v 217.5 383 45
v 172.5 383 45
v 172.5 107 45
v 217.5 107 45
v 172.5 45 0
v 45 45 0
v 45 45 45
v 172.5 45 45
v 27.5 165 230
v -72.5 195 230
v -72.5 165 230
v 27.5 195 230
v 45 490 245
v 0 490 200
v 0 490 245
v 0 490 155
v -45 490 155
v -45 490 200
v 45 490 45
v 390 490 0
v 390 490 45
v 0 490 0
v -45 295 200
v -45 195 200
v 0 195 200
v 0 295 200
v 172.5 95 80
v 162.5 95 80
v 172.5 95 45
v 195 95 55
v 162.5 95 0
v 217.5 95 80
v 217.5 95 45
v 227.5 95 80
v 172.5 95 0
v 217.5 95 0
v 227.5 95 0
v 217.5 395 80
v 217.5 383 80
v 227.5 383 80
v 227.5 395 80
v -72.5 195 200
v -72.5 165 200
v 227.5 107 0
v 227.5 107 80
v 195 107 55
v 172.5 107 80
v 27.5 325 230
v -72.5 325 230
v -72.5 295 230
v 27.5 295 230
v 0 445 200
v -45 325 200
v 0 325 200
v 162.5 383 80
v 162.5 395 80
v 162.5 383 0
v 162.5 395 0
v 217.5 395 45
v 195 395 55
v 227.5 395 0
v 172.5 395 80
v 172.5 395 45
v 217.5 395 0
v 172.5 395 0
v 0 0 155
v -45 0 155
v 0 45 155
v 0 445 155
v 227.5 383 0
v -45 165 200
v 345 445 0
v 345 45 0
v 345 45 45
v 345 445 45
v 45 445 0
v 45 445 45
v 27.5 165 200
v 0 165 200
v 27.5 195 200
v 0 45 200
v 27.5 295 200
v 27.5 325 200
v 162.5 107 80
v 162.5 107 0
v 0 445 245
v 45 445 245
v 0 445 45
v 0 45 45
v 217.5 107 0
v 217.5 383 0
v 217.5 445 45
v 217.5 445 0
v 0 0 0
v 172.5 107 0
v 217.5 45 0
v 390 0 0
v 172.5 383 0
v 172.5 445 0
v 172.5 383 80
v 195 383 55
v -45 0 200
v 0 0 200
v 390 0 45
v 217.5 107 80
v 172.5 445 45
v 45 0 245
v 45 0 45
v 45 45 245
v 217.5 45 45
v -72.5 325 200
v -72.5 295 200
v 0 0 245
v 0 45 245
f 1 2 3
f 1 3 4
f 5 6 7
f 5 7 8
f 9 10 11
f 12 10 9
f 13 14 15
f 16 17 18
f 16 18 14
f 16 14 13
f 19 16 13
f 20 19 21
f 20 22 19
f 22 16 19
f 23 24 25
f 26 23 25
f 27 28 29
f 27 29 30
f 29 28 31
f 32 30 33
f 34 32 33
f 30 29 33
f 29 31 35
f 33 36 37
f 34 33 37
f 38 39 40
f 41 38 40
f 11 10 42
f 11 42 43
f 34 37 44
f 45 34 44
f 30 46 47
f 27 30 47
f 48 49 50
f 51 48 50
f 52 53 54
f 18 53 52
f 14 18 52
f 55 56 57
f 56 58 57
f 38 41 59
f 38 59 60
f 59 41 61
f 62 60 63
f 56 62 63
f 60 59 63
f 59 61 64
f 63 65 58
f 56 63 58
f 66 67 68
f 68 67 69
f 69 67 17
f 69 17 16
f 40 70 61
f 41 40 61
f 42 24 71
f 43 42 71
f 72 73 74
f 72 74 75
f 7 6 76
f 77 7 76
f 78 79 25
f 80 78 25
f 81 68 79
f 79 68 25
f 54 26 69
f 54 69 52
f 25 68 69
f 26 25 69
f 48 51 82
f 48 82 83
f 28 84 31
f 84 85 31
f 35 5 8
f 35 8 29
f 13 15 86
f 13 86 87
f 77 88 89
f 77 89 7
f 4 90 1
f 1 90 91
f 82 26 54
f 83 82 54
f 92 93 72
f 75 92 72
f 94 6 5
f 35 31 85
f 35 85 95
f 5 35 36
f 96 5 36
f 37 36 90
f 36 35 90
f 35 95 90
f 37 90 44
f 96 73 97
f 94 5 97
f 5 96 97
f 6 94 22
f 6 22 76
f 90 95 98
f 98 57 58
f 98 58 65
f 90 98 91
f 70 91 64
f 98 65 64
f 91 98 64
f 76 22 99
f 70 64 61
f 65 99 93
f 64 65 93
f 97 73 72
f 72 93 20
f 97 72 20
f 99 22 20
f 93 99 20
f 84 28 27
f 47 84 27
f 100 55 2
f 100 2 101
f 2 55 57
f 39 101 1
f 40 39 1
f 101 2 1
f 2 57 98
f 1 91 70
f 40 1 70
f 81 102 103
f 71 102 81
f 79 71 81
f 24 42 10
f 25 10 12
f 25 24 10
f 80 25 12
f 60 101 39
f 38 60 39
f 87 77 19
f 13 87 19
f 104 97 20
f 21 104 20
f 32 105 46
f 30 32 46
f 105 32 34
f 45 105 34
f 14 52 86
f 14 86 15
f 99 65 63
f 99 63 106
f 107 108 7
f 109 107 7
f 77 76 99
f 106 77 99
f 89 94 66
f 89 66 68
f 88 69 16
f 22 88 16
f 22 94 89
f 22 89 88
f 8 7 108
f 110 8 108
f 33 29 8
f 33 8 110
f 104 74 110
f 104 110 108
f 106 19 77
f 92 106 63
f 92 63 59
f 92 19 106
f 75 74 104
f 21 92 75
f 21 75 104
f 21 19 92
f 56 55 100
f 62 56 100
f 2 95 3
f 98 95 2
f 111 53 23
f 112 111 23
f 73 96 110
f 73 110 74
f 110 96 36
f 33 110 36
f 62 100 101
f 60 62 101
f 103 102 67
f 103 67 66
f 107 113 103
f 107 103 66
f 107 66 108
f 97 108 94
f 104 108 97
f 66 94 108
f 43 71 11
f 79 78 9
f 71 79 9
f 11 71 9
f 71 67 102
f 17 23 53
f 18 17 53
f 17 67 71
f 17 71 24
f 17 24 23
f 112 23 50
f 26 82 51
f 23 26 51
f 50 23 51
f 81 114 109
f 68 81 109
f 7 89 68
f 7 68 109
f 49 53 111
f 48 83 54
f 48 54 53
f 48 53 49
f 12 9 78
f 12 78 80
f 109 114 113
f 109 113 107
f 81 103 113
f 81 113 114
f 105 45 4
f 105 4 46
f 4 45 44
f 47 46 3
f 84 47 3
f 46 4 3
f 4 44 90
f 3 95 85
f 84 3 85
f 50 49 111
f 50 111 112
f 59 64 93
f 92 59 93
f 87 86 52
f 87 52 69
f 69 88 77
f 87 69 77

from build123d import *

# Parameters (mm, degrees)
F0_W      = 390
F0_H      = 490
F0_W_2    = 127.5
F0_H_2    = 400
F1_DEPTH  = 45
F2_W      = 45
F2_H      = 45
F3_DEPTH  = 200
F4_W      = 45
F4_H      = 45
F5_DEPTH  = 45
F6_W      = 45
F6_H      = 45
F7_DEPTH  = 445
F8_W      = 12
F8_H      = 45
F9_DEPTH  = 10
F10_W     = 12
F10_H     = 45
F11_DEPTH = 10
F13_DEPTH = 35
F15_DEPTH = 12
F16_W     = 12
F16_H     = 45
F17_DEPTH = 10
F18_W     = 12
F18_H     = 45
F19_DEPTH = 10
F21_DEPTH = 35
F23_DEPTH = 12
F24_W     = 45
F24_H     = 30
F25_DEPTH = 30
F26_W     = 30
F26_H     = 30
F27_DEPTH = 27.5
F28_W     = 30
F28_H     = 30
F29_DEPTH = 27.5


with BuildPart() as f1:
    # F0 (on Top) → F1 (new body)
    with BuildSketch(Plane.XY):
        with Locations((195, 245)):
            Rectangle(F0_W, F0_H)
        with Locations((108.75, 245)):
            Rectangle(F0_W_2, F0_H_2, mode=Mode.SUBTRACT)
        with Locations((281.25, 245)):
            Rectangle(F0_W_2, F0_H_2, mode=Mode.SUBTRACT)
    extrude(amount=F1_DEPTH)

    # F2 (on face) → F3 (join)
    with BuildSketch(Plane.XY.offset(45)):
        with Locations((22.5, 22.5)):
            Rectangle(F2_W, F2_H)
        with Locations((22.5, 467.5)):
            Rectangle(F2_W, F2_H)
    extrude(amount=F3_DEPTH)

    # F4 (on face) → F5 (join)
    with BuildSketch(Plane(origin=(0, 0, 0), x_dir=(0, -1, 0), z_dir=(-1, 0, 0))):
        with Locations((-467.5, 177.5)):
            Rectangle(F4_W, F4_H)
    extrude(amount=F5_DEPTH)

    # F6 (on face) → F7 (join)
    with BuildSketch(Plane.XZ.offset(-445)):
        with Locations((-22.5, 177.5)):
            Rectangle(F6_W, F6_H)
    extrude(amount=F7_DEPTH)

    # F8 (on face) → F9 (join)
    with BuildSketch(Plane.YZ.offset(217.5)):
        with Locations((101, 22.5)):
            Rectangle(F8_W, F8_H)
    extrude(amount=F9_DEPTH)

    # F10 (on face) → F11 (join)
    with BuildSketch(Plane(origin=(172.5, 0, 0), x_dir=(0, -1, 0), z_dir=(-1, 0, 0))):
        with Locations((-101, 22.5)):
            Rectangle(F10_W, F10_H)
    extrude(amount=F11_DEPTH)

    # F12 (on face) → F13 (join)
    with BuildSketch(Plane.XY.offset(45)):
        Polygon((217.5, 95), (227.5, 95), (227.5, 107), (217.5, 107), (172.5, 107), (162.5, 107), (162.5, 95), (172.5, 95), align=None)
    extrude(amount=F13_DEPTH)

    # F14 (on face) → F15 (cut)
    with BuildSketch(Plane(origin=(0, 107, 0), x_dir=(-1, 0, 0), z_dir=(0, 1, 0))):
        Polygon((-172.5, 80), (-217.5, 80), (-195, 55), align=None)
    extrude(amount=-F15_DEPTH, mode=Mode.SUBTRACT)

    # F16 (on face) → F17 (join)
    with BuildSketch(Plane.YZ.offset(217.5)):
        with Locations((389, 22.5)):
            Rectangle(F16_W, F16_H)
    extrude(amount=F17_DEPTH)

    # F18 (on face) → F19 (join)
    with BuildSketch(Plane(origin=(172.5, 0, 0), x_dir=(0, -1, 0), z_dir=(-1, 0, 0))):
        with Locations((-389, 22.5)):
            Rectangle(F18_W, F18_H)
    extrude(amount=F19_DEPTH)

    # F20 (on face) → F21 (join)
    with BuildSketch(Plane.XY.offset(45)):
        Polygon((227.5, 383), (227.5, 395), (217.5, 395), (172.5, 395), (162.5, 395), (162.5, 383), (172.5, 383), (217.5, 383), align=None)
    extrude(amount=F21_DEPTH)

    # F22 (on face) → F23 (cut)
    with BuildSketch(Plane.XZ.offset(-383)):
        Polygon((217.5, 80), (172.5, 80), (195, 55), align=None)
    extrude(amount=-F23_DEPTH, mode=Mode.SUBTRACT)

    # F24 (on face) → F25 (join)
    with BuildSketch(Plane.XY.offset(200)):
        with Locations((-22.5, 180)):
            Rectangle(F24_W, F24_H)
        with Locations((-22.5, 310)):
            Rectangle(F24_W, F24_H)
    extrude(amount=F25_DEPTH)

    # F26 (on face) → F27 (join)
    with BuildSketch(Plane.YZ):
        with Locations((310, 215)):
            Rectangle(F26_W, F26_H)
        with Locations((180, 215)):
            Rectangle(F26_W, F26_H)
    extrude(amount=F27_DEPTH)

    # F28 (on face) → F29 (join)
    with BuildSketch(Plane(origin=(-45, 0, 0), x_dir=(0, -1, 0), z_dir=(-1, 0, 0))):
        with Locations((-310, 215)):
            Rectangle(F28_W, F28_H)
        with Locations((-180, 215)):
            Rectangle(F28_W, F28_H)
    extrude(amount=F29_DEPTH)


solid = f1.part
